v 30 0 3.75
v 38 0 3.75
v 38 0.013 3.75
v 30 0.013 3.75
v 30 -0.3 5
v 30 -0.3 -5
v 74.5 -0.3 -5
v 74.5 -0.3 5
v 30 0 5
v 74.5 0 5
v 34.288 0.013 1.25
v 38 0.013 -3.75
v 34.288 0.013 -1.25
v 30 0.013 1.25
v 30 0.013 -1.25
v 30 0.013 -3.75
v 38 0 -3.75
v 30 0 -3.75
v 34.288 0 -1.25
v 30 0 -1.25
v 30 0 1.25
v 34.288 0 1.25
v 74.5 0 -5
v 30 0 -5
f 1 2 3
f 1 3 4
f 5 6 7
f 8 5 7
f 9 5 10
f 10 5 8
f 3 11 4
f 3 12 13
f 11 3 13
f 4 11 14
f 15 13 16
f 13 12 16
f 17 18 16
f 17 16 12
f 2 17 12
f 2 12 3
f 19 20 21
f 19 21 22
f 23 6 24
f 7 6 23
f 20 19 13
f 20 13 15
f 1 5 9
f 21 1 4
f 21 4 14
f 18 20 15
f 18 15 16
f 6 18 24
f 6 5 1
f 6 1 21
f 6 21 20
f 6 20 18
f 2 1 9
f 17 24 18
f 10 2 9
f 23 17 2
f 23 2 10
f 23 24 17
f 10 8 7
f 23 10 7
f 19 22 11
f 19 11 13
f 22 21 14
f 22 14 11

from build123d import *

# Parameters (mm, degrees)
BOSS_EXTRUDE1_DEPTH      = 0.0001
BOSS_EXTRUDE1_DEPTH_BACK = 0.3
SKETCH1_W                = 44.5
SKETCH1_H                = 10
BOSS_EXTRUDE3_DEPTH      = 0.0126


with BuildPart() as part:
    # Sketch1 → Boss-Extrude1 (new, two sides: drawn at the far end of the back side and taken through both)
    with BuildSketch(Plane(origin=(0, 0, 0), x_dir=(1, 0, 0), z_dir=(0, 1, 0)).offset(-BOSS_EXTRUDE1_DEPTH_BACK)):
        with Locations((52.25, 0)):
            Rectangle(SKETCH1_W, SKETCH1_H)
    extrude(amount=BOSS_EXTRUDE1_DEPTH + BOSS_EXTRUDE1_DEPTH_BACK)

    # Sketch2 → Boss-Extrude3 (add)
    with BuildSketch(Plane(origin=(0, 0.0001, 0), x_dir=(1, 0, 0), z_dir=(0, 1, 0))):
        Polygon((30, 3.75), (38, 3.75), (38, -3.75), (30, -3.75), (30, -1.25), (34.288261115, -1.25), (34.288261115, 1.25), (30, 1.25), align=None)
    extrude(amount=BOSS_EXTRUDE3_DEPTH)


solid = part.part
